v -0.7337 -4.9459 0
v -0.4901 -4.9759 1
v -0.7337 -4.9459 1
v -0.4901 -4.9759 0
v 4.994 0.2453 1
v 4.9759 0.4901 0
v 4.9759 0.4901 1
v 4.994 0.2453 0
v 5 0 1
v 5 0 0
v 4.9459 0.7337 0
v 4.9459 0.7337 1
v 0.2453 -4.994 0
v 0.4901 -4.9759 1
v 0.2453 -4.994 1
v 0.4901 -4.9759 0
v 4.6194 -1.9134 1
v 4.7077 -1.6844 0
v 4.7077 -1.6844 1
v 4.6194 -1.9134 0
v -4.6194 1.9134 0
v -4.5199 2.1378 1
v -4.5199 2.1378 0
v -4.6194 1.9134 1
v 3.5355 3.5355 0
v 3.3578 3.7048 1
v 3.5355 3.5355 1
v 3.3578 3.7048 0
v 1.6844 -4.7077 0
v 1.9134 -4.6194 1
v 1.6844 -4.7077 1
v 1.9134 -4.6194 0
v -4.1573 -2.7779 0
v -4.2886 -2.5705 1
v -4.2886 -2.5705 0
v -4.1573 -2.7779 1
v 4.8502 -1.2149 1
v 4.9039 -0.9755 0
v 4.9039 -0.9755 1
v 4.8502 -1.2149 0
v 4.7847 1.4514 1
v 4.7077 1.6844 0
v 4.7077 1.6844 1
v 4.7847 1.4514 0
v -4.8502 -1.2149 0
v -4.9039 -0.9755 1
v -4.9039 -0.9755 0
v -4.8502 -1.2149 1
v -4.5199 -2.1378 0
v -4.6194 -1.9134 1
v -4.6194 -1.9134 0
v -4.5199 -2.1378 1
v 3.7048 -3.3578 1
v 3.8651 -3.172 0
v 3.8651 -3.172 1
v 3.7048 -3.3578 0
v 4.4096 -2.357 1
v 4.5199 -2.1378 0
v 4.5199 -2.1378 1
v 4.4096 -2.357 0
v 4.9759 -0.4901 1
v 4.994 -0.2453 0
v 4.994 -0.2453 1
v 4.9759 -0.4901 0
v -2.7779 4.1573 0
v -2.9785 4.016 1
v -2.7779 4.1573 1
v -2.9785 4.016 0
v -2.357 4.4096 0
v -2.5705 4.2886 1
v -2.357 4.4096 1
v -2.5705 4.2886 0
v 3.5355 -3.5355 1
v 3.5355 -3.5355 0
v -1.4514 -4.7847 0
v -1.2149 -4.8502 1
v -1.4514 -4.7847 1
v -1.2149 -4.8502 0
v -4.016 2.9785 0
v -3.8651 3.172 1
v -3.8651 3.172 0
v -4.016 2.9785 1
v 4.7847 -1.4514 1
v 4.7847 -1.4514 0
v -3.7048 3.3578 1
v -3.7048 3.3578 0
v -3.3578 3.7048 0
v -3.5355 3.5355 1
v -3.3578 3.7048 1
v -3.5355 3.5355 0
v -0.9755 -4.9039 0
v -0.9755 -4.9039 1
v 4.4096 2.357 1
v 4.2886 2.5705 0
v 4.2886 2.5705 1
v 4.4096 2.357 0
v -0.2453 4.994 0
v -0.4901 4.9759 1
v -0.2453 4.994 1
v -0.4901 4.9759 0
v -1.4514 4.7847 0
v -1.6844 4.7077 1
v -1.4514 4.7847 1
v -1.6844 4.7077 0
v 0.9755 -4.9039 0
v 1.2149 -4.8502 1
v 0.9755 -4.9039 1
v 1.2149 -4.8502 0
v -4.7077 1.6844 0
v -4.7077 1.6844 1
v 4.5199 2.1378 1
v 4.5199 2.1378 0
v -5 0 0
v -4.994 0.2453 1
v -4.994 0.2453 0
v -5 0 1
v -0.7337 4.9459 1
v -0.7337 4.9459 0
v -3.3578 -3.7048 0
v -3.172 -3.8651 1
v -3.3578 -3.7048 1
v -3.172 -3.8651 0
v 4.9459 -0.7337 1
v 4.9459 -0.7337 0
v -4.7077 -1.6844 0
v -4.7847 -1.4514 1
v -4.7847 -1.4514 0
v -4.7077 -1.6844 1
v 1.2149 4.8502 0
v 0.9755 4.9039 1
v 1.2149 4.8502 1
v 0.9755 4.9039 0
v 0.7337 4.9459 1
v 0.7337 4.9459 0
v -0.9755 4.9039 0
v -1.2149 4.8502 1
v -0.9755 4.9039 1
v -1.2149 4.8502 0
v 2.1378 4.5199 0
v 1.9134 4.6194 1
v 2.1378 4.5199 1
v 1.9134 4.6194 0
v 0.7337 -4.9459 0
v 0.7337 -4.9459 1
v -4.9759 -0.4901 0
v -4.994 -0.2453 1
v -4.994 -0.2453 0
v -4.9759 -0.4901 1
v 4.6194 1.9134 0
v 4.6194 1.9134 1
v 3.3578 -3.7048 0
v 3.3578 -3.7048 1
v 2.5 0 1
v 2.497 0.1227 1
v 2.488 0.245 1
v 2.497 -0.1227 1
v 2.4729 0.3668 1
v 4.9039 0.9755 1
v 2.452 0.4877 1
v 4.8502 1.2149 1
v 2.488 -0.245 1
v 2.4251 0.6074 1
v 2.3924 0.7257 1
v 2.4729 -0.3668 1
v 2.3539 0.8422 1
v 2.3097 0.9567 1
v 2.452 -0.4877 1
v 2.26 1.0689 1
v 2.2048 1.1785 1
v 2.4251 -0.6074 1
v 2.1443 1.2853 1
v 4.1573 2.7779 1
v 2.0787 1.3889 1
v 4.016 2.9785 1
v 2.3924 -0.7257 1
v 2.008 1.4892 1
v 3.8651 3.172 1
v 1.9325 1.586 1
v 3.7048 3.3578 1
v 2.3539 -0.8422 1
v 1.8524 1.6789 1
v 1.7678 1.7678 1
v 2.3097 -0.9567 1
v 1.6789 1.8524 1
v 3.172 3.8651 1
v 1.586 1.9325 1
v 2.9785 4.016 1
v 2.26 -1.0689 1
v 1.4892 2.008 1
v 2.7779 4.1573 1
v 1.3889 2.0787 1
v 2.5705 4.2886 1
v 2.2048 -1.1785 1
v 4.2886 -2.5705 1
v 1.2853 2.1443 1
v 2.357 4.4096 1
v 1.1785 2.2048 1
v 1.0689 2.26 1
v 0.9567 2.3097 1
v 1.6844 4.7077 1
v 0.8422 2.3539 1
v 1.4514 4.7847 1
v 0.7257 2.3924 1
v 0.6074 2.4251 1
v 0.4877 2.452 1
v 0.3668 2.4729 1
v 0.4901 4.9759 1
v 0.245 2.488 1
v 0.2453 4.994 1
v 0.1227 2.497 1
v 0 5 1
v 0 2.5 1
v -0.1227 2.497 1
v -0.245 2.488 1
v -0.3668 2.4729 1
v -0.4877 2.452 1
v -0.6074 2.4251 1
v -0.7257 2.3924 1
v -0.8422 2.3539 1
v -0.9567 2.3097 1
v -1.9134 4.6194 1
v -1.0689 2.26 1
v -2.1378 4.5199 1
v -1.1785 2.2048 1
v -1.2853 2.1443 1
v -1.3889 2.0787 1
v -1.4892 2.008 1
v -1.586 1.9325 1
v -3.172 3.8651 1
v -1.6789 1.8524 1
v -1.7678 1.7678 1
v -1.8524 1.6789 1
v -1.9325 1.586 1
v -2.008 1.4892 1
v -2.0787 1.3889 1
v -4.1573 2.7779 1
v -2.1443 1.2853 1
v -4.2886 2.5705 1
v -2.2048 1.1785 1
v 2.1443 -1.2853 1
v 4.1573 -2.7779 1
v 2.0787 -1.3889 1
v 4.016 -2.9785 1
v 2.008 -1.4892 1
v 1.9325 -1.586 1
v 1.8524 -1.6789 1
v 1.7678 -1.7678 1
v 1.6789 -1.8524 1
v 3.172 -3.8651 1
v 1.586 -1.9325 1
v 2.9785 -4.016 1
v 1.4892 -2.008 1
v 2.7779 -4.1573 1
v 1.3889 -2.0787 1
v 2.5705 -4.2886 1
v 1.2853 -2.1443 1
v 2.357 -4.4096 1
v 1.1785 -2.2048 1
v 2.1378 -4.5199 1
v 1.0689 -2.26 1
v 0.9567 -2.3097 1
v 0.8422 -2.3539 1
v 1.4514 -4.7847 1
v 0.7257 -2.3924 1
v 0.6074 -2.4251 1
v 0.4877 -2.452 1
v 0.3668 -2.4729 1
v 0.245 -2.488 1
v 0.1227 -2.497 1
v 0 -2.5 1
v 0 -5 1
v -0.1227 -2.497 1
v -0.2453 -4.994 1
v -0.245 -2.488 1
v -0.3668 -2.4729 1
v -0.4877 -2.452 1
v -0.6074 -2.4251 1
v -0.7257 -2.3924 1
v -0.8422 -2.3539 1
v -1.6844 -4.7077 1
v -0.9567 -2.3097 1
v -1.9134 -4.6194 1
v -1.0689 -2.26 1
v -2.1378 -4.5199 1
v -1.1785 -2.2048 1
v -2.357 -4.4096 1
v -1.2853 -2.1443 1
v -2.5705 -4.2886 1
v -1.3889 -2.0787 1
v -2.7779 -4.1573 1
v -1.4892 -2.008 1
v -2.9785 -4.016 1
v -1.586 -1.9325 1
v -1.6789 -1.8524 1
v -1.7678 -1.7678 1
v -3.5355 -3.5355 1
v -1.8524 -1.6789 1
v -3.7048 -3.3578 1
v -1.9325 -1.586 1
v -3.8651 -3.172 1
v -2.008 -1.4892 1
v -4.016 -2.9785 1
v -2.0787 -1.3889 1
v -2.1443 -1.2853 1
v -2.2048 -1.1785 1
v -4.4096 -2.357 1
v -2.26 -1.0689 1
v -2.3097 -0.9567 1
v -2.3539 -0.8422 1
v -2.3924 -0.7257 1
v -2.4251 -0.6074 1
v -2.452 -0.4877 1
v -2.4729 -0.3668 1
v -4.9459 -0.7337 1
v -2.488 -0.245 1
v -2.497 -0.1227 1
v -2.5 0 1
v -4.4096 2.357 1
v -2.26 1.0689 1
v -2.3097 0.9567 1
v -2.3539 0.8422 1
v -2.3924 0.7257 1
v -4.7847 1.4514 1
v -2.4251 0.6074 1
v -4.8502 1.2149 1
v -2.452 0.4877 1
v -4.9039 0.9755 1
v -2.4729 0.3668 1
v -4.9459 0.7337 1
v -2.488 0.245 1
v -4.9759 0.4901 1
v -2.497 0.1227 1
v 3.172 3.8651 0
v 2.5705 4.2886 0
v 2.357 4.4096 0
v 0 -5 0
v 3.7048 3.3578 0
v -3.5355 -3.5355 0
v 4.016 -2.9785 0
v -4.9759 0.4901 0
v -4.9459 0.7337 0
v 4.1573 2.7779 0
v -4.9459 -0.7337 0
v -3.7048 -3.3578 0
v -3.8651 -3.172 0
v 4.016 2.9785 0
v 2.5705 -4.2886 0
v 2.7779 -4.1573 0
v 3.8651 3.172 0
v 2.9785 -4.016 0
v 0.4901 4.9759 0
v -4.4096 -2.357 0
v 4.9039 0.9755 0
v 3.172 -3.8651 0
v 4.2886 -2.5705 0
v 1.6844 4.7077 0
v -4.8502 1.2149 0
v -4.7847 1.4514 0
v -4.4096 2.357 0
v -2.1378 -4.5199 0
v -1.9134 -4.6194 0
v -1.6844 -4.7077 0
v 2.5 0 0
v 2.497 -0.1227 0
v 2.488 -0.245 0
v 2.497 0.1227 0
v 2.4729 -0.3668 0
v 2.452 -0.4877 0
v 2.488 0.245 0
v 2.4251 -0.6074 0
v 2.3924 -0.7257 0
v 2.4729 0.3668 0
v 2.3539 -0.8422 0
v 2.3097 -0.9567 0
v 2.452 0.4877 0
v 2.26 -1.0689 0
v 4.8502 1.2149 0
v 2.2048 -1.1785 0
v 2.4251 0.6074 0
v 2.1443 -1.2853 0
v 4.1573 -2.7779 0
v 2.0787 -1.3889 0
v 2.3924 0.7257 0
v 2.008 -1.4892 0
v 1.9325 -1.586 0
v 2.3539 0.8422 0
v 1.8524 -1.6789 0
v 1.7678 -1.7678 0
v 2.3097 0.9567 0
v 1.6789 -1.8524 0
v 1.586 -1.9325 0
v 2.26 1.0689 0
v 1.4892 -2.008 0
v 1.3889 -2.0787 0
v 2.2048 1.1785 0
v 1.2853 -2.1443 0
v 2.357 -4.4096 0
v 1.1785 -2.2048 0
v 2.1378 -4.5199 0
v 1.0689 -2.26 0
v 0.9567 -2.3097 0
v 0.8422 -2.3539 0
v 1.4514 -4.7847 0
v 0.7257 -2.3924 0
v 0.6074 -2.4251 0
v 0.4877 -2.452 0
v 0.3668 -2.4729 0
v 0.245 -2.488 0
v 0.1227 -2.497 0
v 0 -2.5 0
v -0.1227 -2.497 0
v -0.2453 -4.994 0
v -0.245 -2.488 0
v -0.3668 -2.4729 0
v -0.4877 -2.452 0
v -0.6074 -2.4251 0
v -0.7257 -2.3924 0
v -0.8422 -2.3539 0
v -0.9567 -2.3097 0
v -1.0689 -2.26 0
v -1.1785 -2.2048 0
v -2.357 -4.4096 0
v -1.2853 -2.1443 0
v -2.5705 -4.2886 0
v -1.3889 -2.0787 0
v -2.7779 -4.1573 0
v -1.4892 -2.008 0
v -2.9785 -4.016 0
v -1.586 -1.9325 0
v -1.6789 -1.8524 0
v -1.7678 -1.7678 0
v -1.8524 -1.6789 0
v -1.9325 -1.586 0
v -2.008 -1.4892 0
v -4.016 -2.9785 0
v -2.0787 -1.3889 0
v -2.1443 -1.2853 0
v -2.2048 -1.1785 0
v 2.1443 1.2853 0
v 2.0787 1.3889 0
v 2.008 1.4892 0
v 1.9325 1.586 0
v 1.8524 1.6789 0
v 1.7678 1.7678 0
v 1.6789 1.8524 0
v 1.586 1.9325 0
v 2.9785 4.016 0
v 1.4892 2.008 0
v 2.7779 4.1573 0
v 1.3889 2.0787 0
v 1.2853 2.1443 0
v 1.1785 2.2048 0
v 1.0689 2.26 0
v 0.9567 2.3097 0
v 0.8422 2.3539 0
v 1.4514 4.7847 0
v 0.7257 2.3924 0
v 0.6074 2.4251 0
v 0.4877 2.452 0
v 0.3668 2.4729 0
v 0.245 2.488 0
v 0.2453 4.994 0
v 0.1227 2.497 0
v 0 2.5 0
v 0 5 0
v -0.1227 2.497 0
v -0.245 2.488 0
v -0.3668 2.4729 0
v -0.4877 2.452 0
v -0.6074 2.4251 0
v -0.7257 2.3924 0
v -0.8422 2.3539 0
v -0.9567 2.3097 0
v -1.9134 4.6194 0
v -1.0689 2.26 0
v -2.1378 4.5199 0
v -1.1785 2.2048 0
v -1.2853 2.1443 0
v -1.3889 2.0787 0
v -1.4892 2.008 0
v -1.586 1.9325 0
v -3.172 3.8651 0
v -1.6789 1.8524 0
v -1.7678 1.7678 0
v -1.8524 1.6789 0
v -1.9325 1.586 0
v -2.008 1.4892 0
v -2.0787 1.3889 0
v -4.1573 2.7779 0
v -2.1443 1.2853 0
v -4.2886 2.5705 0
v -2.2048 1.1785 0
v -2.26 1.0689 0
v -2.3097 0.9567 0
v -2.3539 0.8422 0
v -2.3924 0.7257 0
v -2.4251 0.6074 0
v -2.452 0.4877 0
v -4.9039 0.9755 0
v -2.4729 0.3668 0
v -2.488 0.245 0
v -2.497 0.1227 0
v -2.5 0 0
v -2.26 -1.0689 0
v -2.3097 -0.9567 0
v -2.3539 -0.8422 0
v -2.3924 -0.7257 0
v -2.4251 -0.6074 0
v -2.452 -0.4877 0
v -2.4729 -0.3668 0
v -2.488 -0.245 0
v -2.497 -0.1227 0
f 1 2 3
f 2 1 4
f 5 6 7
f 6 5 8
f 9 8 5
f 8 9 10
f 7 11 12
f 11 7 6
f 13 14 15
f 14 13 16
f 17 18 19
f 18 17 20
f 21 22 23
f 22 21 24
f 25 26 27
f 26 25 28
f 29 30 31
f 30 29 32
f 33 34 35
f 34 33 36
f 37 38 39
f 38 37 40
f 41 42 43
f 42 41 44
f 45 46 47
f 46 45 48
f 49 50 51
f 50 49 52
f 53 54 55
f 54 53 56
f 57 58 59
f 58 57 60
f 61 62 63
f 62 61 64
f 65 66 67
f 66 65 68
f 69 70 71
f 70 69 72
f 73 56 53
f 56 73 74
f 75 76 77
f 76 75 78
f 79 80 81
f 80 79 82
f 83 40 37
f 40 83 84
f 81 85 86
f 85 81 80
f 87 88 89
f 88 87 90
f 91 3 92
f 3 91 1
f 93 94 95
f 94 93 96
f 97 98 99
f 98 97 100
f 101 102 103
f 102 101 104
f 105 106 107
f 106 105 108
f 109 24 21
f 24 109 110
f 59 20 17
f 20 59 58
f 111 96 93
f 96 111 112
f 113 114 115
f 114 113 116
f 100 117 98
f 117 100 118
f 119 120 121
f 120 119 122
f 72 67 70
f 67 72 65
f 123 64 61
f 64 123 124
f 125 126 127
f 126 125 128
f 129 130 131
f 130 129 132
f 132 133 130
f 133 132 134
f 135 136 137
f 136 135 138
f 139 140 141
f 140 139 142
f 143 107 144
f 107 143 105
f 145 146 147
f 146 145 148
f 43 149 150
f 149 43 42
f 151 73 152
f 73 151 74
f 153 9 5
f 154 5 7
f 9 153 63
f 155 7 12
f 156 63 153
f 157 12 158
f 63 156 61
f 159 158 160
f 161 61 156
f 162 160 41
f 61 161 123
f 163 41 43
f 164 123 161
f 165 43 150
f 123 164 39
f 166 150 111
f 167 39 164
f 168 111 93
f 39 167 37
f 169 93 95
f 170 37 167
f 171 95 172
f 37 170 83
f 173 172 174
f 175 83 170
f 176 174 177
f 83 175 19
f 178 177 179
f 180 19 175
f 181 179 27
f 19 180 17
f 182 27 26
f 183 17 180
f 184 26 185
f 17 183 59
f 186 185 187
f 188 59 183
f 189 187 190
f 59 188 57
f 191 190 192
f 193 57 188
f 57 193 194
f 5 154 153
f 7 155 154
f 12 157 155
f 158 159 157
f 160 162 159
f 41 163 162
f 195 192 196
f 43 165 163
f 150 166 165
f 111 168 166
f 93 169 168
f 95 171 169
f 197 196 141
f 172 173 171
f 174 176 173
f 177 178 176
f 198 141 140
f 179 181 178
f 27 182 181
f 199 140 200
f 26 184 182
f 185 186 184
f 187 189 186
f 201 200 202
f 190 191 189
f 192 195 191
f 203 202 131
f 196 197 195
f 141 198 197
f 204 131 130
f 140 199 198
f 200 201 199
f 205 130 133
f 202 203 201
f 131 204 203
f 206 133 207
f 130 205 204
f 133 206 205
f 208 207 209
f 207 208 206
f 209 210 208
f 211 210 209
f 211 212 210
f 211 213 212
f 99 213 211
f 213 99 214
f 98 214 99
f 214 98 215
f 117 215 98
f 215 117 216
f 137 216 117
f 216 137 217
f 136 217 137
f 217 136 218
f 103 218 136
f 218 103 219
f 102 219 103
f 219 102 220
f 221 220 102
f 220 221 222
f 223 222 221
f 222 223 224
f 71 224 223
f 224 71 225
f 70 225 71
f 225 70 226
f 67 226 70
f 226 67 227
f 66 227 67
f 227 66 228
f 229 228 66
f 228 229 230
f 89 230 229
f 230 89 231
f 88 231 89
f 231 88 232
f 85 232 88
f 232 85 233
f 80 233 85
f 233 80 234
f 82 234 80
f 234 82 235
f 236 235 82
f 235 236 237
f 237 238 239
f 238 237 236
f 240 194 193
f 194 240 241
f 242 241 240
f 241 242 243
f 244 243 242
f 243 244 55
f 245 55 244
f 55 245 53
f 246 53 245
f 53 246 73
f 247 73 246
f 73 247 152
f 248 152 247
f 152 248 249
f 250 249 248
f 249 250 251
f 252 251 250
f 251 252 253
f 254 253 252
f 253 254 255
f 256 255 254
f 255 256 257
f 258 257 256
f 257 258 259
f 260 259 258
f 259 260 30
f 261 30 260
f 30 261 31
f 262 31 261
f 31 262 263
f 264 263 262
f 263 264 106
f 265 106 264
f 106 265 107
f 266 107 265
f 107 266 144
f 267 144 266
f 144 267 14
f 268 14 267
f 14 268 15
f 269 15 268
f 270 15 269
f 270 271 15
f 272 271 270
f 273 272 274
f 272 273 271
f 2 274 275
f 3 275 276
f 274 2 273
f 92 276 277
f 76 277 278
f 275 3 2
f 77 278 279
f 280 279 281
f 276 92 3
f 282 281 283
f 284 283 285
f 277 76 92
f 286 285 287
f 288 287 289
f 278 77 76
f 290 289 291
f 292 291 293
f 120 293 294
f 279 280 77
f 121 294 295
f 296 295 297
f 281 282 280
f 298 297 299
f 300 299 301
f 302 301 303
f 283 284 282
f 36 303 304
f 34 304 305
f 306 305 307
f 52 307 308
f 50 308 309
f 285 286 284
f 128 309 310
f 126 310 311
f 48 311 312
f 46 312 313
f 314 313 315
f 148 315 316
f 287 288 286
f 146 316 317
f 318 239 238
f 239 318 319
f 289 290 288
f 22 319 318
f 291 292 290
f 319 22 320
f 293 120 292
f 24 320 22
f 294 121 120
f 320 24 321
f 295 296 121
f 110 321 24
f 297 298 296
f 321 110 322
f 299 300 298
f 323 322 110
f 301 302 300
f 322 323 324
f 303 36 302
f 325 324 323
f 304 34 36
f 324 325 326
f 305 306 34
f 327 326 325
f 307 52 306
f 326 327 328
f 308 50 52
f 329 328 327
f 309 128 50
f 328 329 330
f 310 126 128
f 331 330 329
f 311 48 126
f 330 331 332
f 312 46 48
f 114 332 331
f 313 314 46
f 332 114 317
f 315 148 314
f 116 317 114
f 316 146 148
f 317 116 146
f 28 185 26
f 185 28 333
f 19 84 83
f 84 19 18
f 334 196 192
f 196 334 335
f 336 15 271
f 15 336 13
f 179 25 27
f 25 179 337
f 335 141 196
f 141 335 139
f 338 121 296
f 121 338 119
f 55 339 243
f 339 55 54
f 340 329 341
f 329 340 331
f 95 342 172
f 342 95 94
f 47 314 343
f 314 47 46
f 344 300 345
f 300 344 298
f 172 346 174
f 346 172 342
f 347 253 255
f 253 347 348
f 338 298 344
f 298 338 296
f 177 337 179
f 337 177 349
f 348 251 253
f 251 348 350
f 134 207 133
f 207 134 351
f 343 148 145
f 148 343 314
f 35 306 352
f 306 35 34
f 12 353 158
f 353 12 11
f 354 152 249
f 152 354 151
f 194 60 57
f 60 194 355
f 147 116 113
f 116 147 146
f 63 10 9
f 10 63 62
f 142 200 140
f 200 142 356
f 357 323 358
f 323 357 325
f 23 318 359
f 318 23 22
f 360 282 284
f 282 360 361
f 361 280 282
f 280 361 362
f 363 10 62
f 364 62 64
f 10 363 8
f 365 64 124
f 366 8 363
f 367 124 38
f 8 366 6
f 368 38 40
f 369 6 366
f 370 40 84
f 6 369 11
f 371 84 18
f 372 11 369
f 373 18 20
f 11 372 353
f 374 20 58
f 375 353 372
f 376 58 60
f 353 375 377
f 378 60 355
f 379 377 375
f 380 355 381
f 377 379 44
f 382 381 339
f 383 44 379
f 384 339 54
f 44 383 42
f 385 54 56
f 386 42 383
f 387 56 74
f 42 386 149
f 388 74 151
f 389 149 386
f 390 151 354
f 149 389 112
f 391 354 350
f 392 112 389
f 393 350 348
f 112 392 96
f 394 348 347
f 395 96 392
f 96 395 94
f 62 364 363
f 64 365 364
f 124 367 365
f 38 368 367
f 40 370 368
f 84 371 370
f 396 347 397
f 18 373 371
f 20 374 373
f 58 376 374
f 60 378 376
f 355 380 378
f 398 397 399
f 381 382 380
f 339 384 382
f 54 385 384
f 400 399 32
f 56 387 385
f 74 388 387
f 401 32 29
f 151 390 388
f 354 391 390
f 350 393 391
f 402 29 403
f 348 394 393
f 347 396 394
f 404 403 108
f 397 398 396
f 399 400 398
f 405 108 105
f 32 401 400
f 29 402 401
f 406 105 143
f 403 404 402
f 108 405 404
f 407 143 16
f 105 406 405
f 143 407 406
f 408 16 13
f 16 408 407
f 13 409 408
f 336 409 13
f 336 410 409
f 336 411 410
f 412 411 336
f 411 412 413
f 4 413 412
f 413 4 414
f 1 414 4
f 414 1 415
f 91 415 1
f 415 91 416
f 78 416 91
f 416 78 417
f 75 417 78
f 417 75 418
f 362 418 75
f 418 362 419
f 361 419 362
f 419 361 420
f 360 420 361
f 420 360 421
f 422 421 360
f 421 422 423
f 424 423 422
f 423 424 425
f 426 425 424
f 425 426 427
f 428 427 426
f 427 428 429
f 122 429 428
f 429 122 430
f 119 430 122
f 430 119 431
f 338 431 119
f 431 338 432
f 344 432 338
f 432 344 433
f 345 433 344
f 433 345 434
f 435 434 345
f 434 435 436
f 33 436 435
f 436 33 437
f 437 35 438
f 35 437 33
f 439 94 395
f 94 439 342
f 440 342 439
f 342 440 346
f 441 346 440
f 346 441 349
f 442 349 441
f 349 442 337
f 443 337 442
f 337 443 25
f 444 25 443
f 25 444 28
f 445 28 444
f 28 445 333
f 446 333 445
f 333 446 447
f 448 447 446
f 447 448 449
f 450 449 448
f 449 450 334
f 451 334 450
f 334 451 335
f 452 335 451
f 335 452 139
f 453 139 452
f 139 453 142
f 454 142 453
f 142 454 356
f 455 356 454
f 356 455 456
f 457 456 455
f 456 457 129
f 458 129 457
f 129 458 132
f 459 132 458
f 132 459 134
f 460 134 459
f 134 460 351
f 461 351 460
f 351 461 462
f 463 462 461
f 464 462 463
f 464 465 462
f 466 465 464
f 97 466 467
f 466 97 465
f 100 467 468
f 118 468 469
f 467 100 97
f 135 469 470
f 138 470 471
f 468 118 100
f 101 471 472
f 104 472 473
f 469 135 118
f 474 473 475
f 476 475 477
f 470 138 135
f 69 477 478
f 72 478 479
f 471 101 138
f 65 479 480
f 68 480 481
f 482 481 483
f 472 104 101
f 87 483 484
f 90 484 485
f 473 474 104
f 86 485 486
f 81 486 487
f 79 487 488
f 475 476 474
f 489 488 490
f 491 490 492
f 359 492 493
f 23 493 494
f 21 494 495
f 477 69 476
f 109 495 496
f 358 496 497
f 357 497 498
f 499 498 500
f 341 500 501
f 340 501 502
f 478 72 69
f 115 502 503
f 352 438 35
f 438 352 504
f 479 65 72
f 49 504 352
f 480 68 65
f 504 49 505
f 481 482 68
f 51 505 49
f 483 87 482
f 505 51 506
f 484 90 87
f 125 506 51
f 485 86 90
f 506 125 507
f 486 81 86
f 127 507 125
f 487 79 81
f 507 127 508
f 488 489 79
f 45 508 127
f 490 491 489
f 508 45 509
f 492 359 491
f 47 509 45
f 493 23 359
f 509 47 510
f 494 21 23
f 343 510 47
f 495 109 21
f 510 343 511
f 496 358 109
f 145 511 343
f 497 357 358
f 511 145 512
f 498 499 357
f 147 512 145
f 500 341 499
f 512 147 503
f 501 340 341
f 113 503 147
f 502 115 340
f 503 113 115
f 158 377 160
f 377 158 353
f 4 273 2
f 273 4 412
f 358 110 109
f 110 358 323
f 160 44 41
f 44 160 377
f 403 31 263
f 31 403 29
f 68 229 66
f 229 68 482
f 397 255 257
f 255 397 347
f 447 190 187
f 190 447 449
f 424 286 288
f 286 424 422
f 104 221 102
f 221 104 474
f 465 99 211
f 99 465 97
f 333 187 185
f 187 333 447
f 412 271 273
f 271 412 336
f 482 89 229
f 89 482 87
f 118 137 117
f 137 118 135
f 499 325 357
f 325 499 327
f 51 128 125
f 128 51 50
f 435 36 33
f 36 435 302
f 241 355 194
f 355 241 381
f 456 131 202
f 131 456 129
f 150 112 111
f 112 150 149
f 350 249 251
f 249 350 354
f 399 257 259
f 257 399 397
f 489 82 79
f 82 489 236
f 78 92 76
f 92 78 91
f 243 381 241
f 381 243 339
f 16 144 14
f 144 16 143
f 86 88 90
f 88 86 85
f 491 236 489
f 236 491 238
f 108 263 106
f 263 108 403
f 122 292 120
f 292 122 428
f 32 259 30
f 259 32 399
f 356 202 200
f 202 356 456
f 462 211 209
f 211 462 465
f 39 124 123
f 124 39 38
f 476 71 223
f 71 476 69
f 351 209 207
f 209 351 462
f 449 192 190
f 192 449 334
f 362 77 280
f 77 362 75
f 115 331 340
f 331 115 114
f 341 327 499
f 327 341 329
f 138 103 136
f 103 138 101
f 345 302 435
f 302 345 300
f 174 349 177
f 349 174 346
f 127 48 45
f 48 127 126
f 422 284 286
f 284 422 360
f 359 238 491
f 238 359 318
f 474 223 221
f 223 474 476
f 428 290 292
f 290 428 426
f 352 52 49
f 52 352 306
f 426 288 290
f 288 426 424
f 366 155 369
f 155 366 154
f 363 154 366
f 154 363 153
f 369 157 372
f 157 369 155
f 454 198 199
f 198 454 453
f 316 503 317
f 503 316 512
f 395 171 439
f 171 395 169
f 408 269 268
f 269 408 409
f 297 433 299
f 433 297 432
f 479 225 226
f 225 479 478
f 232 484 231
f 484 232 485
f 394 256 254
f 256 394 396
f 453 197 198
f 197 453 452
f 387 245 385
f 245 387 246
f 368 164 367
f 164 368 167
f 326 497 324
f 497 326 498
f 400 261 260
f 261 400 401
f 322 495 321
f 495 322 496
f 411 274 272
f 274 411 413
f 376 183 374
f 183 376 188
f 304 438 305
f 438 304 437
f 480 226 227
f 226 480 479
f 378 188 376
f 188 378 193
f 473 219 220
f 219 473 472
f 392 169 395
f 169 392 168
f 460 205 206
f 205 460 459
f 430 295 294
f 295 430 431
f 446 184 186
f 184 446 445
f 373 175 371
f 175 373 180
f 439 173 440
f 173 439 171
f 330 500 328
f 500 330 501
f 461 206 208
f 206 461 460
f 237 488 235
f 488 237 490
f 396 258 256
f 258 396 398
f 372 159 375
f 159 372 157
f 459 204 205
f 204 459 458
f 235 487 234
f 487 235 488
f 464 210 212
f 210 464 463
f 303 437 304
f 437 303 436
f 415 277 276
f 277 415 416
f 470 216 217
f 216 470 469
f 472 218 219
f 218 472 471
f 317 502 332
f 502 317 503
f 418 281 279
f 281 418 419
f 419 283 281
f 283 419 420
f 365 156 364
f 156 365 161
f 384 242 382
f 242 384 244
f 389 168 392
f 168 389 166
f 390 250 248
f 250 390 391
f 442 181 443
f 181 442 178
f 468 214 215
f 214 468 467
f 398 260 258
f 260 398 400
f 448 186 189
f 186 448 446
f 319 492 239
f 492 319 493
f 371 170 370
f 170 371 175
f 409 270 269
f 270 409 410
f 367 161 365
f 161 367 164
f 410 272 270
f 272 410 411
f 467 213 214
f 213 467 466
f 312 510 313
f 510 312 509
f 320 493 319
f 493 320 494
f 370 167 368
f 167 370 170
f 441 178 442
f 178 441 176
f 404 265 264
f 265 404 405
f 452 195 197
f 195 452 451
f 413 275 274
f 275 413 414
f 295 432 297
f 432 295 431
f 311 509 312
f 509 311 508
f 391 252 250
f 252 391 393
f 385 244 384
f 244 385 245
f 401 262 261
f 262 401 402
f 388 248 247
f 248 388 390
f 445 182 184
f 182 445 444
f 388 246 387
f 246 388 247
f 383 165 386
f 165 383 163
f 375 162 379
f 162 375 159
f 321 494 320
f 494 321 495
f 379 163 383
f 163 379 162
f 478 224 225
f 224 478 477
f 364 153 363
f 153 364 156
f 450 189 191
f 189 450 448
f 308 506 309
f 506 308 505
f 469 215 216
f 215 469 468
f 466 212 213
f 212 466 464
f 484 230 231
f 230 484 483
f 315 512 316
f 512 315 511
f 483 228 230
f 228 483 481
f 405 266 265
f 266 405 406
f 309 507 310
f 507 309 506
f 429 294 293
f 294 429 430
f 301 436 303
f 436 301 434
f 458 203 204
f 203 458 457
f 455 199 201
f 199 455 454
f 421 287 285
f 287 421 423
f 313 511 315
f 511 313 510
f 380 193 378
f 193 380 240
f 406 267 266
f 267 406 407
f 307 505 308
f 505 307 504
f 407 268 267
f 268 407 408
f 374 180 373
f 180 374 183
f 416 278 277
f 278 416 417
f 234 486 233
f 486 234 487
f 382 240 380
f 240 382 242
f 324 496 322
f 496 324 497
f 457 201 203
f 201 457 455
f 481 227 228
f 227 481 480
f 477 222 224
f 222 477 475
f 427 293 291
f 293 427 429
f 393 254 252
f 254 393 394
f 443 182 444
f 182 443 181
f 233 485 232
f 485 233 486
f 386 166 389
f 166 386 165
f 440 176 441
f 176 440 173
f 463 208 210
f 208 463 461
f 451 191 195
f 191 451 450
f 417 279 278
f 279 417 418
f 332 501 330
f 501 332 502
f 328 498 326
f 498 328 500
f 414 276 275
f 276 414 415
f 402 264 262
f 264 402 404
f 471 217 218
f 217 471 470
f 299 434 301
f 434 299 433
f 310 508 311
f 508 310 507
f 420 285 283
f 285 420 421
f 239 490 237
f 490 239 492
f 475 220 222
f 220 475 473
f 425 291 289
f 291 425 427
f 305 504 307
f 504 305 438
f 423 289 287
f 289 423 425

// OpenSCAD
$fn = 128;

inner_d = 5.0;
outer_d = 10.0;
thickness = 1.0;

difference() {
  cylinder(d = outer_d, h = thickness);
  translate([0, 0, -0.1])
    cylinder(d = inner_d, h = thickness + 0.2);
}
